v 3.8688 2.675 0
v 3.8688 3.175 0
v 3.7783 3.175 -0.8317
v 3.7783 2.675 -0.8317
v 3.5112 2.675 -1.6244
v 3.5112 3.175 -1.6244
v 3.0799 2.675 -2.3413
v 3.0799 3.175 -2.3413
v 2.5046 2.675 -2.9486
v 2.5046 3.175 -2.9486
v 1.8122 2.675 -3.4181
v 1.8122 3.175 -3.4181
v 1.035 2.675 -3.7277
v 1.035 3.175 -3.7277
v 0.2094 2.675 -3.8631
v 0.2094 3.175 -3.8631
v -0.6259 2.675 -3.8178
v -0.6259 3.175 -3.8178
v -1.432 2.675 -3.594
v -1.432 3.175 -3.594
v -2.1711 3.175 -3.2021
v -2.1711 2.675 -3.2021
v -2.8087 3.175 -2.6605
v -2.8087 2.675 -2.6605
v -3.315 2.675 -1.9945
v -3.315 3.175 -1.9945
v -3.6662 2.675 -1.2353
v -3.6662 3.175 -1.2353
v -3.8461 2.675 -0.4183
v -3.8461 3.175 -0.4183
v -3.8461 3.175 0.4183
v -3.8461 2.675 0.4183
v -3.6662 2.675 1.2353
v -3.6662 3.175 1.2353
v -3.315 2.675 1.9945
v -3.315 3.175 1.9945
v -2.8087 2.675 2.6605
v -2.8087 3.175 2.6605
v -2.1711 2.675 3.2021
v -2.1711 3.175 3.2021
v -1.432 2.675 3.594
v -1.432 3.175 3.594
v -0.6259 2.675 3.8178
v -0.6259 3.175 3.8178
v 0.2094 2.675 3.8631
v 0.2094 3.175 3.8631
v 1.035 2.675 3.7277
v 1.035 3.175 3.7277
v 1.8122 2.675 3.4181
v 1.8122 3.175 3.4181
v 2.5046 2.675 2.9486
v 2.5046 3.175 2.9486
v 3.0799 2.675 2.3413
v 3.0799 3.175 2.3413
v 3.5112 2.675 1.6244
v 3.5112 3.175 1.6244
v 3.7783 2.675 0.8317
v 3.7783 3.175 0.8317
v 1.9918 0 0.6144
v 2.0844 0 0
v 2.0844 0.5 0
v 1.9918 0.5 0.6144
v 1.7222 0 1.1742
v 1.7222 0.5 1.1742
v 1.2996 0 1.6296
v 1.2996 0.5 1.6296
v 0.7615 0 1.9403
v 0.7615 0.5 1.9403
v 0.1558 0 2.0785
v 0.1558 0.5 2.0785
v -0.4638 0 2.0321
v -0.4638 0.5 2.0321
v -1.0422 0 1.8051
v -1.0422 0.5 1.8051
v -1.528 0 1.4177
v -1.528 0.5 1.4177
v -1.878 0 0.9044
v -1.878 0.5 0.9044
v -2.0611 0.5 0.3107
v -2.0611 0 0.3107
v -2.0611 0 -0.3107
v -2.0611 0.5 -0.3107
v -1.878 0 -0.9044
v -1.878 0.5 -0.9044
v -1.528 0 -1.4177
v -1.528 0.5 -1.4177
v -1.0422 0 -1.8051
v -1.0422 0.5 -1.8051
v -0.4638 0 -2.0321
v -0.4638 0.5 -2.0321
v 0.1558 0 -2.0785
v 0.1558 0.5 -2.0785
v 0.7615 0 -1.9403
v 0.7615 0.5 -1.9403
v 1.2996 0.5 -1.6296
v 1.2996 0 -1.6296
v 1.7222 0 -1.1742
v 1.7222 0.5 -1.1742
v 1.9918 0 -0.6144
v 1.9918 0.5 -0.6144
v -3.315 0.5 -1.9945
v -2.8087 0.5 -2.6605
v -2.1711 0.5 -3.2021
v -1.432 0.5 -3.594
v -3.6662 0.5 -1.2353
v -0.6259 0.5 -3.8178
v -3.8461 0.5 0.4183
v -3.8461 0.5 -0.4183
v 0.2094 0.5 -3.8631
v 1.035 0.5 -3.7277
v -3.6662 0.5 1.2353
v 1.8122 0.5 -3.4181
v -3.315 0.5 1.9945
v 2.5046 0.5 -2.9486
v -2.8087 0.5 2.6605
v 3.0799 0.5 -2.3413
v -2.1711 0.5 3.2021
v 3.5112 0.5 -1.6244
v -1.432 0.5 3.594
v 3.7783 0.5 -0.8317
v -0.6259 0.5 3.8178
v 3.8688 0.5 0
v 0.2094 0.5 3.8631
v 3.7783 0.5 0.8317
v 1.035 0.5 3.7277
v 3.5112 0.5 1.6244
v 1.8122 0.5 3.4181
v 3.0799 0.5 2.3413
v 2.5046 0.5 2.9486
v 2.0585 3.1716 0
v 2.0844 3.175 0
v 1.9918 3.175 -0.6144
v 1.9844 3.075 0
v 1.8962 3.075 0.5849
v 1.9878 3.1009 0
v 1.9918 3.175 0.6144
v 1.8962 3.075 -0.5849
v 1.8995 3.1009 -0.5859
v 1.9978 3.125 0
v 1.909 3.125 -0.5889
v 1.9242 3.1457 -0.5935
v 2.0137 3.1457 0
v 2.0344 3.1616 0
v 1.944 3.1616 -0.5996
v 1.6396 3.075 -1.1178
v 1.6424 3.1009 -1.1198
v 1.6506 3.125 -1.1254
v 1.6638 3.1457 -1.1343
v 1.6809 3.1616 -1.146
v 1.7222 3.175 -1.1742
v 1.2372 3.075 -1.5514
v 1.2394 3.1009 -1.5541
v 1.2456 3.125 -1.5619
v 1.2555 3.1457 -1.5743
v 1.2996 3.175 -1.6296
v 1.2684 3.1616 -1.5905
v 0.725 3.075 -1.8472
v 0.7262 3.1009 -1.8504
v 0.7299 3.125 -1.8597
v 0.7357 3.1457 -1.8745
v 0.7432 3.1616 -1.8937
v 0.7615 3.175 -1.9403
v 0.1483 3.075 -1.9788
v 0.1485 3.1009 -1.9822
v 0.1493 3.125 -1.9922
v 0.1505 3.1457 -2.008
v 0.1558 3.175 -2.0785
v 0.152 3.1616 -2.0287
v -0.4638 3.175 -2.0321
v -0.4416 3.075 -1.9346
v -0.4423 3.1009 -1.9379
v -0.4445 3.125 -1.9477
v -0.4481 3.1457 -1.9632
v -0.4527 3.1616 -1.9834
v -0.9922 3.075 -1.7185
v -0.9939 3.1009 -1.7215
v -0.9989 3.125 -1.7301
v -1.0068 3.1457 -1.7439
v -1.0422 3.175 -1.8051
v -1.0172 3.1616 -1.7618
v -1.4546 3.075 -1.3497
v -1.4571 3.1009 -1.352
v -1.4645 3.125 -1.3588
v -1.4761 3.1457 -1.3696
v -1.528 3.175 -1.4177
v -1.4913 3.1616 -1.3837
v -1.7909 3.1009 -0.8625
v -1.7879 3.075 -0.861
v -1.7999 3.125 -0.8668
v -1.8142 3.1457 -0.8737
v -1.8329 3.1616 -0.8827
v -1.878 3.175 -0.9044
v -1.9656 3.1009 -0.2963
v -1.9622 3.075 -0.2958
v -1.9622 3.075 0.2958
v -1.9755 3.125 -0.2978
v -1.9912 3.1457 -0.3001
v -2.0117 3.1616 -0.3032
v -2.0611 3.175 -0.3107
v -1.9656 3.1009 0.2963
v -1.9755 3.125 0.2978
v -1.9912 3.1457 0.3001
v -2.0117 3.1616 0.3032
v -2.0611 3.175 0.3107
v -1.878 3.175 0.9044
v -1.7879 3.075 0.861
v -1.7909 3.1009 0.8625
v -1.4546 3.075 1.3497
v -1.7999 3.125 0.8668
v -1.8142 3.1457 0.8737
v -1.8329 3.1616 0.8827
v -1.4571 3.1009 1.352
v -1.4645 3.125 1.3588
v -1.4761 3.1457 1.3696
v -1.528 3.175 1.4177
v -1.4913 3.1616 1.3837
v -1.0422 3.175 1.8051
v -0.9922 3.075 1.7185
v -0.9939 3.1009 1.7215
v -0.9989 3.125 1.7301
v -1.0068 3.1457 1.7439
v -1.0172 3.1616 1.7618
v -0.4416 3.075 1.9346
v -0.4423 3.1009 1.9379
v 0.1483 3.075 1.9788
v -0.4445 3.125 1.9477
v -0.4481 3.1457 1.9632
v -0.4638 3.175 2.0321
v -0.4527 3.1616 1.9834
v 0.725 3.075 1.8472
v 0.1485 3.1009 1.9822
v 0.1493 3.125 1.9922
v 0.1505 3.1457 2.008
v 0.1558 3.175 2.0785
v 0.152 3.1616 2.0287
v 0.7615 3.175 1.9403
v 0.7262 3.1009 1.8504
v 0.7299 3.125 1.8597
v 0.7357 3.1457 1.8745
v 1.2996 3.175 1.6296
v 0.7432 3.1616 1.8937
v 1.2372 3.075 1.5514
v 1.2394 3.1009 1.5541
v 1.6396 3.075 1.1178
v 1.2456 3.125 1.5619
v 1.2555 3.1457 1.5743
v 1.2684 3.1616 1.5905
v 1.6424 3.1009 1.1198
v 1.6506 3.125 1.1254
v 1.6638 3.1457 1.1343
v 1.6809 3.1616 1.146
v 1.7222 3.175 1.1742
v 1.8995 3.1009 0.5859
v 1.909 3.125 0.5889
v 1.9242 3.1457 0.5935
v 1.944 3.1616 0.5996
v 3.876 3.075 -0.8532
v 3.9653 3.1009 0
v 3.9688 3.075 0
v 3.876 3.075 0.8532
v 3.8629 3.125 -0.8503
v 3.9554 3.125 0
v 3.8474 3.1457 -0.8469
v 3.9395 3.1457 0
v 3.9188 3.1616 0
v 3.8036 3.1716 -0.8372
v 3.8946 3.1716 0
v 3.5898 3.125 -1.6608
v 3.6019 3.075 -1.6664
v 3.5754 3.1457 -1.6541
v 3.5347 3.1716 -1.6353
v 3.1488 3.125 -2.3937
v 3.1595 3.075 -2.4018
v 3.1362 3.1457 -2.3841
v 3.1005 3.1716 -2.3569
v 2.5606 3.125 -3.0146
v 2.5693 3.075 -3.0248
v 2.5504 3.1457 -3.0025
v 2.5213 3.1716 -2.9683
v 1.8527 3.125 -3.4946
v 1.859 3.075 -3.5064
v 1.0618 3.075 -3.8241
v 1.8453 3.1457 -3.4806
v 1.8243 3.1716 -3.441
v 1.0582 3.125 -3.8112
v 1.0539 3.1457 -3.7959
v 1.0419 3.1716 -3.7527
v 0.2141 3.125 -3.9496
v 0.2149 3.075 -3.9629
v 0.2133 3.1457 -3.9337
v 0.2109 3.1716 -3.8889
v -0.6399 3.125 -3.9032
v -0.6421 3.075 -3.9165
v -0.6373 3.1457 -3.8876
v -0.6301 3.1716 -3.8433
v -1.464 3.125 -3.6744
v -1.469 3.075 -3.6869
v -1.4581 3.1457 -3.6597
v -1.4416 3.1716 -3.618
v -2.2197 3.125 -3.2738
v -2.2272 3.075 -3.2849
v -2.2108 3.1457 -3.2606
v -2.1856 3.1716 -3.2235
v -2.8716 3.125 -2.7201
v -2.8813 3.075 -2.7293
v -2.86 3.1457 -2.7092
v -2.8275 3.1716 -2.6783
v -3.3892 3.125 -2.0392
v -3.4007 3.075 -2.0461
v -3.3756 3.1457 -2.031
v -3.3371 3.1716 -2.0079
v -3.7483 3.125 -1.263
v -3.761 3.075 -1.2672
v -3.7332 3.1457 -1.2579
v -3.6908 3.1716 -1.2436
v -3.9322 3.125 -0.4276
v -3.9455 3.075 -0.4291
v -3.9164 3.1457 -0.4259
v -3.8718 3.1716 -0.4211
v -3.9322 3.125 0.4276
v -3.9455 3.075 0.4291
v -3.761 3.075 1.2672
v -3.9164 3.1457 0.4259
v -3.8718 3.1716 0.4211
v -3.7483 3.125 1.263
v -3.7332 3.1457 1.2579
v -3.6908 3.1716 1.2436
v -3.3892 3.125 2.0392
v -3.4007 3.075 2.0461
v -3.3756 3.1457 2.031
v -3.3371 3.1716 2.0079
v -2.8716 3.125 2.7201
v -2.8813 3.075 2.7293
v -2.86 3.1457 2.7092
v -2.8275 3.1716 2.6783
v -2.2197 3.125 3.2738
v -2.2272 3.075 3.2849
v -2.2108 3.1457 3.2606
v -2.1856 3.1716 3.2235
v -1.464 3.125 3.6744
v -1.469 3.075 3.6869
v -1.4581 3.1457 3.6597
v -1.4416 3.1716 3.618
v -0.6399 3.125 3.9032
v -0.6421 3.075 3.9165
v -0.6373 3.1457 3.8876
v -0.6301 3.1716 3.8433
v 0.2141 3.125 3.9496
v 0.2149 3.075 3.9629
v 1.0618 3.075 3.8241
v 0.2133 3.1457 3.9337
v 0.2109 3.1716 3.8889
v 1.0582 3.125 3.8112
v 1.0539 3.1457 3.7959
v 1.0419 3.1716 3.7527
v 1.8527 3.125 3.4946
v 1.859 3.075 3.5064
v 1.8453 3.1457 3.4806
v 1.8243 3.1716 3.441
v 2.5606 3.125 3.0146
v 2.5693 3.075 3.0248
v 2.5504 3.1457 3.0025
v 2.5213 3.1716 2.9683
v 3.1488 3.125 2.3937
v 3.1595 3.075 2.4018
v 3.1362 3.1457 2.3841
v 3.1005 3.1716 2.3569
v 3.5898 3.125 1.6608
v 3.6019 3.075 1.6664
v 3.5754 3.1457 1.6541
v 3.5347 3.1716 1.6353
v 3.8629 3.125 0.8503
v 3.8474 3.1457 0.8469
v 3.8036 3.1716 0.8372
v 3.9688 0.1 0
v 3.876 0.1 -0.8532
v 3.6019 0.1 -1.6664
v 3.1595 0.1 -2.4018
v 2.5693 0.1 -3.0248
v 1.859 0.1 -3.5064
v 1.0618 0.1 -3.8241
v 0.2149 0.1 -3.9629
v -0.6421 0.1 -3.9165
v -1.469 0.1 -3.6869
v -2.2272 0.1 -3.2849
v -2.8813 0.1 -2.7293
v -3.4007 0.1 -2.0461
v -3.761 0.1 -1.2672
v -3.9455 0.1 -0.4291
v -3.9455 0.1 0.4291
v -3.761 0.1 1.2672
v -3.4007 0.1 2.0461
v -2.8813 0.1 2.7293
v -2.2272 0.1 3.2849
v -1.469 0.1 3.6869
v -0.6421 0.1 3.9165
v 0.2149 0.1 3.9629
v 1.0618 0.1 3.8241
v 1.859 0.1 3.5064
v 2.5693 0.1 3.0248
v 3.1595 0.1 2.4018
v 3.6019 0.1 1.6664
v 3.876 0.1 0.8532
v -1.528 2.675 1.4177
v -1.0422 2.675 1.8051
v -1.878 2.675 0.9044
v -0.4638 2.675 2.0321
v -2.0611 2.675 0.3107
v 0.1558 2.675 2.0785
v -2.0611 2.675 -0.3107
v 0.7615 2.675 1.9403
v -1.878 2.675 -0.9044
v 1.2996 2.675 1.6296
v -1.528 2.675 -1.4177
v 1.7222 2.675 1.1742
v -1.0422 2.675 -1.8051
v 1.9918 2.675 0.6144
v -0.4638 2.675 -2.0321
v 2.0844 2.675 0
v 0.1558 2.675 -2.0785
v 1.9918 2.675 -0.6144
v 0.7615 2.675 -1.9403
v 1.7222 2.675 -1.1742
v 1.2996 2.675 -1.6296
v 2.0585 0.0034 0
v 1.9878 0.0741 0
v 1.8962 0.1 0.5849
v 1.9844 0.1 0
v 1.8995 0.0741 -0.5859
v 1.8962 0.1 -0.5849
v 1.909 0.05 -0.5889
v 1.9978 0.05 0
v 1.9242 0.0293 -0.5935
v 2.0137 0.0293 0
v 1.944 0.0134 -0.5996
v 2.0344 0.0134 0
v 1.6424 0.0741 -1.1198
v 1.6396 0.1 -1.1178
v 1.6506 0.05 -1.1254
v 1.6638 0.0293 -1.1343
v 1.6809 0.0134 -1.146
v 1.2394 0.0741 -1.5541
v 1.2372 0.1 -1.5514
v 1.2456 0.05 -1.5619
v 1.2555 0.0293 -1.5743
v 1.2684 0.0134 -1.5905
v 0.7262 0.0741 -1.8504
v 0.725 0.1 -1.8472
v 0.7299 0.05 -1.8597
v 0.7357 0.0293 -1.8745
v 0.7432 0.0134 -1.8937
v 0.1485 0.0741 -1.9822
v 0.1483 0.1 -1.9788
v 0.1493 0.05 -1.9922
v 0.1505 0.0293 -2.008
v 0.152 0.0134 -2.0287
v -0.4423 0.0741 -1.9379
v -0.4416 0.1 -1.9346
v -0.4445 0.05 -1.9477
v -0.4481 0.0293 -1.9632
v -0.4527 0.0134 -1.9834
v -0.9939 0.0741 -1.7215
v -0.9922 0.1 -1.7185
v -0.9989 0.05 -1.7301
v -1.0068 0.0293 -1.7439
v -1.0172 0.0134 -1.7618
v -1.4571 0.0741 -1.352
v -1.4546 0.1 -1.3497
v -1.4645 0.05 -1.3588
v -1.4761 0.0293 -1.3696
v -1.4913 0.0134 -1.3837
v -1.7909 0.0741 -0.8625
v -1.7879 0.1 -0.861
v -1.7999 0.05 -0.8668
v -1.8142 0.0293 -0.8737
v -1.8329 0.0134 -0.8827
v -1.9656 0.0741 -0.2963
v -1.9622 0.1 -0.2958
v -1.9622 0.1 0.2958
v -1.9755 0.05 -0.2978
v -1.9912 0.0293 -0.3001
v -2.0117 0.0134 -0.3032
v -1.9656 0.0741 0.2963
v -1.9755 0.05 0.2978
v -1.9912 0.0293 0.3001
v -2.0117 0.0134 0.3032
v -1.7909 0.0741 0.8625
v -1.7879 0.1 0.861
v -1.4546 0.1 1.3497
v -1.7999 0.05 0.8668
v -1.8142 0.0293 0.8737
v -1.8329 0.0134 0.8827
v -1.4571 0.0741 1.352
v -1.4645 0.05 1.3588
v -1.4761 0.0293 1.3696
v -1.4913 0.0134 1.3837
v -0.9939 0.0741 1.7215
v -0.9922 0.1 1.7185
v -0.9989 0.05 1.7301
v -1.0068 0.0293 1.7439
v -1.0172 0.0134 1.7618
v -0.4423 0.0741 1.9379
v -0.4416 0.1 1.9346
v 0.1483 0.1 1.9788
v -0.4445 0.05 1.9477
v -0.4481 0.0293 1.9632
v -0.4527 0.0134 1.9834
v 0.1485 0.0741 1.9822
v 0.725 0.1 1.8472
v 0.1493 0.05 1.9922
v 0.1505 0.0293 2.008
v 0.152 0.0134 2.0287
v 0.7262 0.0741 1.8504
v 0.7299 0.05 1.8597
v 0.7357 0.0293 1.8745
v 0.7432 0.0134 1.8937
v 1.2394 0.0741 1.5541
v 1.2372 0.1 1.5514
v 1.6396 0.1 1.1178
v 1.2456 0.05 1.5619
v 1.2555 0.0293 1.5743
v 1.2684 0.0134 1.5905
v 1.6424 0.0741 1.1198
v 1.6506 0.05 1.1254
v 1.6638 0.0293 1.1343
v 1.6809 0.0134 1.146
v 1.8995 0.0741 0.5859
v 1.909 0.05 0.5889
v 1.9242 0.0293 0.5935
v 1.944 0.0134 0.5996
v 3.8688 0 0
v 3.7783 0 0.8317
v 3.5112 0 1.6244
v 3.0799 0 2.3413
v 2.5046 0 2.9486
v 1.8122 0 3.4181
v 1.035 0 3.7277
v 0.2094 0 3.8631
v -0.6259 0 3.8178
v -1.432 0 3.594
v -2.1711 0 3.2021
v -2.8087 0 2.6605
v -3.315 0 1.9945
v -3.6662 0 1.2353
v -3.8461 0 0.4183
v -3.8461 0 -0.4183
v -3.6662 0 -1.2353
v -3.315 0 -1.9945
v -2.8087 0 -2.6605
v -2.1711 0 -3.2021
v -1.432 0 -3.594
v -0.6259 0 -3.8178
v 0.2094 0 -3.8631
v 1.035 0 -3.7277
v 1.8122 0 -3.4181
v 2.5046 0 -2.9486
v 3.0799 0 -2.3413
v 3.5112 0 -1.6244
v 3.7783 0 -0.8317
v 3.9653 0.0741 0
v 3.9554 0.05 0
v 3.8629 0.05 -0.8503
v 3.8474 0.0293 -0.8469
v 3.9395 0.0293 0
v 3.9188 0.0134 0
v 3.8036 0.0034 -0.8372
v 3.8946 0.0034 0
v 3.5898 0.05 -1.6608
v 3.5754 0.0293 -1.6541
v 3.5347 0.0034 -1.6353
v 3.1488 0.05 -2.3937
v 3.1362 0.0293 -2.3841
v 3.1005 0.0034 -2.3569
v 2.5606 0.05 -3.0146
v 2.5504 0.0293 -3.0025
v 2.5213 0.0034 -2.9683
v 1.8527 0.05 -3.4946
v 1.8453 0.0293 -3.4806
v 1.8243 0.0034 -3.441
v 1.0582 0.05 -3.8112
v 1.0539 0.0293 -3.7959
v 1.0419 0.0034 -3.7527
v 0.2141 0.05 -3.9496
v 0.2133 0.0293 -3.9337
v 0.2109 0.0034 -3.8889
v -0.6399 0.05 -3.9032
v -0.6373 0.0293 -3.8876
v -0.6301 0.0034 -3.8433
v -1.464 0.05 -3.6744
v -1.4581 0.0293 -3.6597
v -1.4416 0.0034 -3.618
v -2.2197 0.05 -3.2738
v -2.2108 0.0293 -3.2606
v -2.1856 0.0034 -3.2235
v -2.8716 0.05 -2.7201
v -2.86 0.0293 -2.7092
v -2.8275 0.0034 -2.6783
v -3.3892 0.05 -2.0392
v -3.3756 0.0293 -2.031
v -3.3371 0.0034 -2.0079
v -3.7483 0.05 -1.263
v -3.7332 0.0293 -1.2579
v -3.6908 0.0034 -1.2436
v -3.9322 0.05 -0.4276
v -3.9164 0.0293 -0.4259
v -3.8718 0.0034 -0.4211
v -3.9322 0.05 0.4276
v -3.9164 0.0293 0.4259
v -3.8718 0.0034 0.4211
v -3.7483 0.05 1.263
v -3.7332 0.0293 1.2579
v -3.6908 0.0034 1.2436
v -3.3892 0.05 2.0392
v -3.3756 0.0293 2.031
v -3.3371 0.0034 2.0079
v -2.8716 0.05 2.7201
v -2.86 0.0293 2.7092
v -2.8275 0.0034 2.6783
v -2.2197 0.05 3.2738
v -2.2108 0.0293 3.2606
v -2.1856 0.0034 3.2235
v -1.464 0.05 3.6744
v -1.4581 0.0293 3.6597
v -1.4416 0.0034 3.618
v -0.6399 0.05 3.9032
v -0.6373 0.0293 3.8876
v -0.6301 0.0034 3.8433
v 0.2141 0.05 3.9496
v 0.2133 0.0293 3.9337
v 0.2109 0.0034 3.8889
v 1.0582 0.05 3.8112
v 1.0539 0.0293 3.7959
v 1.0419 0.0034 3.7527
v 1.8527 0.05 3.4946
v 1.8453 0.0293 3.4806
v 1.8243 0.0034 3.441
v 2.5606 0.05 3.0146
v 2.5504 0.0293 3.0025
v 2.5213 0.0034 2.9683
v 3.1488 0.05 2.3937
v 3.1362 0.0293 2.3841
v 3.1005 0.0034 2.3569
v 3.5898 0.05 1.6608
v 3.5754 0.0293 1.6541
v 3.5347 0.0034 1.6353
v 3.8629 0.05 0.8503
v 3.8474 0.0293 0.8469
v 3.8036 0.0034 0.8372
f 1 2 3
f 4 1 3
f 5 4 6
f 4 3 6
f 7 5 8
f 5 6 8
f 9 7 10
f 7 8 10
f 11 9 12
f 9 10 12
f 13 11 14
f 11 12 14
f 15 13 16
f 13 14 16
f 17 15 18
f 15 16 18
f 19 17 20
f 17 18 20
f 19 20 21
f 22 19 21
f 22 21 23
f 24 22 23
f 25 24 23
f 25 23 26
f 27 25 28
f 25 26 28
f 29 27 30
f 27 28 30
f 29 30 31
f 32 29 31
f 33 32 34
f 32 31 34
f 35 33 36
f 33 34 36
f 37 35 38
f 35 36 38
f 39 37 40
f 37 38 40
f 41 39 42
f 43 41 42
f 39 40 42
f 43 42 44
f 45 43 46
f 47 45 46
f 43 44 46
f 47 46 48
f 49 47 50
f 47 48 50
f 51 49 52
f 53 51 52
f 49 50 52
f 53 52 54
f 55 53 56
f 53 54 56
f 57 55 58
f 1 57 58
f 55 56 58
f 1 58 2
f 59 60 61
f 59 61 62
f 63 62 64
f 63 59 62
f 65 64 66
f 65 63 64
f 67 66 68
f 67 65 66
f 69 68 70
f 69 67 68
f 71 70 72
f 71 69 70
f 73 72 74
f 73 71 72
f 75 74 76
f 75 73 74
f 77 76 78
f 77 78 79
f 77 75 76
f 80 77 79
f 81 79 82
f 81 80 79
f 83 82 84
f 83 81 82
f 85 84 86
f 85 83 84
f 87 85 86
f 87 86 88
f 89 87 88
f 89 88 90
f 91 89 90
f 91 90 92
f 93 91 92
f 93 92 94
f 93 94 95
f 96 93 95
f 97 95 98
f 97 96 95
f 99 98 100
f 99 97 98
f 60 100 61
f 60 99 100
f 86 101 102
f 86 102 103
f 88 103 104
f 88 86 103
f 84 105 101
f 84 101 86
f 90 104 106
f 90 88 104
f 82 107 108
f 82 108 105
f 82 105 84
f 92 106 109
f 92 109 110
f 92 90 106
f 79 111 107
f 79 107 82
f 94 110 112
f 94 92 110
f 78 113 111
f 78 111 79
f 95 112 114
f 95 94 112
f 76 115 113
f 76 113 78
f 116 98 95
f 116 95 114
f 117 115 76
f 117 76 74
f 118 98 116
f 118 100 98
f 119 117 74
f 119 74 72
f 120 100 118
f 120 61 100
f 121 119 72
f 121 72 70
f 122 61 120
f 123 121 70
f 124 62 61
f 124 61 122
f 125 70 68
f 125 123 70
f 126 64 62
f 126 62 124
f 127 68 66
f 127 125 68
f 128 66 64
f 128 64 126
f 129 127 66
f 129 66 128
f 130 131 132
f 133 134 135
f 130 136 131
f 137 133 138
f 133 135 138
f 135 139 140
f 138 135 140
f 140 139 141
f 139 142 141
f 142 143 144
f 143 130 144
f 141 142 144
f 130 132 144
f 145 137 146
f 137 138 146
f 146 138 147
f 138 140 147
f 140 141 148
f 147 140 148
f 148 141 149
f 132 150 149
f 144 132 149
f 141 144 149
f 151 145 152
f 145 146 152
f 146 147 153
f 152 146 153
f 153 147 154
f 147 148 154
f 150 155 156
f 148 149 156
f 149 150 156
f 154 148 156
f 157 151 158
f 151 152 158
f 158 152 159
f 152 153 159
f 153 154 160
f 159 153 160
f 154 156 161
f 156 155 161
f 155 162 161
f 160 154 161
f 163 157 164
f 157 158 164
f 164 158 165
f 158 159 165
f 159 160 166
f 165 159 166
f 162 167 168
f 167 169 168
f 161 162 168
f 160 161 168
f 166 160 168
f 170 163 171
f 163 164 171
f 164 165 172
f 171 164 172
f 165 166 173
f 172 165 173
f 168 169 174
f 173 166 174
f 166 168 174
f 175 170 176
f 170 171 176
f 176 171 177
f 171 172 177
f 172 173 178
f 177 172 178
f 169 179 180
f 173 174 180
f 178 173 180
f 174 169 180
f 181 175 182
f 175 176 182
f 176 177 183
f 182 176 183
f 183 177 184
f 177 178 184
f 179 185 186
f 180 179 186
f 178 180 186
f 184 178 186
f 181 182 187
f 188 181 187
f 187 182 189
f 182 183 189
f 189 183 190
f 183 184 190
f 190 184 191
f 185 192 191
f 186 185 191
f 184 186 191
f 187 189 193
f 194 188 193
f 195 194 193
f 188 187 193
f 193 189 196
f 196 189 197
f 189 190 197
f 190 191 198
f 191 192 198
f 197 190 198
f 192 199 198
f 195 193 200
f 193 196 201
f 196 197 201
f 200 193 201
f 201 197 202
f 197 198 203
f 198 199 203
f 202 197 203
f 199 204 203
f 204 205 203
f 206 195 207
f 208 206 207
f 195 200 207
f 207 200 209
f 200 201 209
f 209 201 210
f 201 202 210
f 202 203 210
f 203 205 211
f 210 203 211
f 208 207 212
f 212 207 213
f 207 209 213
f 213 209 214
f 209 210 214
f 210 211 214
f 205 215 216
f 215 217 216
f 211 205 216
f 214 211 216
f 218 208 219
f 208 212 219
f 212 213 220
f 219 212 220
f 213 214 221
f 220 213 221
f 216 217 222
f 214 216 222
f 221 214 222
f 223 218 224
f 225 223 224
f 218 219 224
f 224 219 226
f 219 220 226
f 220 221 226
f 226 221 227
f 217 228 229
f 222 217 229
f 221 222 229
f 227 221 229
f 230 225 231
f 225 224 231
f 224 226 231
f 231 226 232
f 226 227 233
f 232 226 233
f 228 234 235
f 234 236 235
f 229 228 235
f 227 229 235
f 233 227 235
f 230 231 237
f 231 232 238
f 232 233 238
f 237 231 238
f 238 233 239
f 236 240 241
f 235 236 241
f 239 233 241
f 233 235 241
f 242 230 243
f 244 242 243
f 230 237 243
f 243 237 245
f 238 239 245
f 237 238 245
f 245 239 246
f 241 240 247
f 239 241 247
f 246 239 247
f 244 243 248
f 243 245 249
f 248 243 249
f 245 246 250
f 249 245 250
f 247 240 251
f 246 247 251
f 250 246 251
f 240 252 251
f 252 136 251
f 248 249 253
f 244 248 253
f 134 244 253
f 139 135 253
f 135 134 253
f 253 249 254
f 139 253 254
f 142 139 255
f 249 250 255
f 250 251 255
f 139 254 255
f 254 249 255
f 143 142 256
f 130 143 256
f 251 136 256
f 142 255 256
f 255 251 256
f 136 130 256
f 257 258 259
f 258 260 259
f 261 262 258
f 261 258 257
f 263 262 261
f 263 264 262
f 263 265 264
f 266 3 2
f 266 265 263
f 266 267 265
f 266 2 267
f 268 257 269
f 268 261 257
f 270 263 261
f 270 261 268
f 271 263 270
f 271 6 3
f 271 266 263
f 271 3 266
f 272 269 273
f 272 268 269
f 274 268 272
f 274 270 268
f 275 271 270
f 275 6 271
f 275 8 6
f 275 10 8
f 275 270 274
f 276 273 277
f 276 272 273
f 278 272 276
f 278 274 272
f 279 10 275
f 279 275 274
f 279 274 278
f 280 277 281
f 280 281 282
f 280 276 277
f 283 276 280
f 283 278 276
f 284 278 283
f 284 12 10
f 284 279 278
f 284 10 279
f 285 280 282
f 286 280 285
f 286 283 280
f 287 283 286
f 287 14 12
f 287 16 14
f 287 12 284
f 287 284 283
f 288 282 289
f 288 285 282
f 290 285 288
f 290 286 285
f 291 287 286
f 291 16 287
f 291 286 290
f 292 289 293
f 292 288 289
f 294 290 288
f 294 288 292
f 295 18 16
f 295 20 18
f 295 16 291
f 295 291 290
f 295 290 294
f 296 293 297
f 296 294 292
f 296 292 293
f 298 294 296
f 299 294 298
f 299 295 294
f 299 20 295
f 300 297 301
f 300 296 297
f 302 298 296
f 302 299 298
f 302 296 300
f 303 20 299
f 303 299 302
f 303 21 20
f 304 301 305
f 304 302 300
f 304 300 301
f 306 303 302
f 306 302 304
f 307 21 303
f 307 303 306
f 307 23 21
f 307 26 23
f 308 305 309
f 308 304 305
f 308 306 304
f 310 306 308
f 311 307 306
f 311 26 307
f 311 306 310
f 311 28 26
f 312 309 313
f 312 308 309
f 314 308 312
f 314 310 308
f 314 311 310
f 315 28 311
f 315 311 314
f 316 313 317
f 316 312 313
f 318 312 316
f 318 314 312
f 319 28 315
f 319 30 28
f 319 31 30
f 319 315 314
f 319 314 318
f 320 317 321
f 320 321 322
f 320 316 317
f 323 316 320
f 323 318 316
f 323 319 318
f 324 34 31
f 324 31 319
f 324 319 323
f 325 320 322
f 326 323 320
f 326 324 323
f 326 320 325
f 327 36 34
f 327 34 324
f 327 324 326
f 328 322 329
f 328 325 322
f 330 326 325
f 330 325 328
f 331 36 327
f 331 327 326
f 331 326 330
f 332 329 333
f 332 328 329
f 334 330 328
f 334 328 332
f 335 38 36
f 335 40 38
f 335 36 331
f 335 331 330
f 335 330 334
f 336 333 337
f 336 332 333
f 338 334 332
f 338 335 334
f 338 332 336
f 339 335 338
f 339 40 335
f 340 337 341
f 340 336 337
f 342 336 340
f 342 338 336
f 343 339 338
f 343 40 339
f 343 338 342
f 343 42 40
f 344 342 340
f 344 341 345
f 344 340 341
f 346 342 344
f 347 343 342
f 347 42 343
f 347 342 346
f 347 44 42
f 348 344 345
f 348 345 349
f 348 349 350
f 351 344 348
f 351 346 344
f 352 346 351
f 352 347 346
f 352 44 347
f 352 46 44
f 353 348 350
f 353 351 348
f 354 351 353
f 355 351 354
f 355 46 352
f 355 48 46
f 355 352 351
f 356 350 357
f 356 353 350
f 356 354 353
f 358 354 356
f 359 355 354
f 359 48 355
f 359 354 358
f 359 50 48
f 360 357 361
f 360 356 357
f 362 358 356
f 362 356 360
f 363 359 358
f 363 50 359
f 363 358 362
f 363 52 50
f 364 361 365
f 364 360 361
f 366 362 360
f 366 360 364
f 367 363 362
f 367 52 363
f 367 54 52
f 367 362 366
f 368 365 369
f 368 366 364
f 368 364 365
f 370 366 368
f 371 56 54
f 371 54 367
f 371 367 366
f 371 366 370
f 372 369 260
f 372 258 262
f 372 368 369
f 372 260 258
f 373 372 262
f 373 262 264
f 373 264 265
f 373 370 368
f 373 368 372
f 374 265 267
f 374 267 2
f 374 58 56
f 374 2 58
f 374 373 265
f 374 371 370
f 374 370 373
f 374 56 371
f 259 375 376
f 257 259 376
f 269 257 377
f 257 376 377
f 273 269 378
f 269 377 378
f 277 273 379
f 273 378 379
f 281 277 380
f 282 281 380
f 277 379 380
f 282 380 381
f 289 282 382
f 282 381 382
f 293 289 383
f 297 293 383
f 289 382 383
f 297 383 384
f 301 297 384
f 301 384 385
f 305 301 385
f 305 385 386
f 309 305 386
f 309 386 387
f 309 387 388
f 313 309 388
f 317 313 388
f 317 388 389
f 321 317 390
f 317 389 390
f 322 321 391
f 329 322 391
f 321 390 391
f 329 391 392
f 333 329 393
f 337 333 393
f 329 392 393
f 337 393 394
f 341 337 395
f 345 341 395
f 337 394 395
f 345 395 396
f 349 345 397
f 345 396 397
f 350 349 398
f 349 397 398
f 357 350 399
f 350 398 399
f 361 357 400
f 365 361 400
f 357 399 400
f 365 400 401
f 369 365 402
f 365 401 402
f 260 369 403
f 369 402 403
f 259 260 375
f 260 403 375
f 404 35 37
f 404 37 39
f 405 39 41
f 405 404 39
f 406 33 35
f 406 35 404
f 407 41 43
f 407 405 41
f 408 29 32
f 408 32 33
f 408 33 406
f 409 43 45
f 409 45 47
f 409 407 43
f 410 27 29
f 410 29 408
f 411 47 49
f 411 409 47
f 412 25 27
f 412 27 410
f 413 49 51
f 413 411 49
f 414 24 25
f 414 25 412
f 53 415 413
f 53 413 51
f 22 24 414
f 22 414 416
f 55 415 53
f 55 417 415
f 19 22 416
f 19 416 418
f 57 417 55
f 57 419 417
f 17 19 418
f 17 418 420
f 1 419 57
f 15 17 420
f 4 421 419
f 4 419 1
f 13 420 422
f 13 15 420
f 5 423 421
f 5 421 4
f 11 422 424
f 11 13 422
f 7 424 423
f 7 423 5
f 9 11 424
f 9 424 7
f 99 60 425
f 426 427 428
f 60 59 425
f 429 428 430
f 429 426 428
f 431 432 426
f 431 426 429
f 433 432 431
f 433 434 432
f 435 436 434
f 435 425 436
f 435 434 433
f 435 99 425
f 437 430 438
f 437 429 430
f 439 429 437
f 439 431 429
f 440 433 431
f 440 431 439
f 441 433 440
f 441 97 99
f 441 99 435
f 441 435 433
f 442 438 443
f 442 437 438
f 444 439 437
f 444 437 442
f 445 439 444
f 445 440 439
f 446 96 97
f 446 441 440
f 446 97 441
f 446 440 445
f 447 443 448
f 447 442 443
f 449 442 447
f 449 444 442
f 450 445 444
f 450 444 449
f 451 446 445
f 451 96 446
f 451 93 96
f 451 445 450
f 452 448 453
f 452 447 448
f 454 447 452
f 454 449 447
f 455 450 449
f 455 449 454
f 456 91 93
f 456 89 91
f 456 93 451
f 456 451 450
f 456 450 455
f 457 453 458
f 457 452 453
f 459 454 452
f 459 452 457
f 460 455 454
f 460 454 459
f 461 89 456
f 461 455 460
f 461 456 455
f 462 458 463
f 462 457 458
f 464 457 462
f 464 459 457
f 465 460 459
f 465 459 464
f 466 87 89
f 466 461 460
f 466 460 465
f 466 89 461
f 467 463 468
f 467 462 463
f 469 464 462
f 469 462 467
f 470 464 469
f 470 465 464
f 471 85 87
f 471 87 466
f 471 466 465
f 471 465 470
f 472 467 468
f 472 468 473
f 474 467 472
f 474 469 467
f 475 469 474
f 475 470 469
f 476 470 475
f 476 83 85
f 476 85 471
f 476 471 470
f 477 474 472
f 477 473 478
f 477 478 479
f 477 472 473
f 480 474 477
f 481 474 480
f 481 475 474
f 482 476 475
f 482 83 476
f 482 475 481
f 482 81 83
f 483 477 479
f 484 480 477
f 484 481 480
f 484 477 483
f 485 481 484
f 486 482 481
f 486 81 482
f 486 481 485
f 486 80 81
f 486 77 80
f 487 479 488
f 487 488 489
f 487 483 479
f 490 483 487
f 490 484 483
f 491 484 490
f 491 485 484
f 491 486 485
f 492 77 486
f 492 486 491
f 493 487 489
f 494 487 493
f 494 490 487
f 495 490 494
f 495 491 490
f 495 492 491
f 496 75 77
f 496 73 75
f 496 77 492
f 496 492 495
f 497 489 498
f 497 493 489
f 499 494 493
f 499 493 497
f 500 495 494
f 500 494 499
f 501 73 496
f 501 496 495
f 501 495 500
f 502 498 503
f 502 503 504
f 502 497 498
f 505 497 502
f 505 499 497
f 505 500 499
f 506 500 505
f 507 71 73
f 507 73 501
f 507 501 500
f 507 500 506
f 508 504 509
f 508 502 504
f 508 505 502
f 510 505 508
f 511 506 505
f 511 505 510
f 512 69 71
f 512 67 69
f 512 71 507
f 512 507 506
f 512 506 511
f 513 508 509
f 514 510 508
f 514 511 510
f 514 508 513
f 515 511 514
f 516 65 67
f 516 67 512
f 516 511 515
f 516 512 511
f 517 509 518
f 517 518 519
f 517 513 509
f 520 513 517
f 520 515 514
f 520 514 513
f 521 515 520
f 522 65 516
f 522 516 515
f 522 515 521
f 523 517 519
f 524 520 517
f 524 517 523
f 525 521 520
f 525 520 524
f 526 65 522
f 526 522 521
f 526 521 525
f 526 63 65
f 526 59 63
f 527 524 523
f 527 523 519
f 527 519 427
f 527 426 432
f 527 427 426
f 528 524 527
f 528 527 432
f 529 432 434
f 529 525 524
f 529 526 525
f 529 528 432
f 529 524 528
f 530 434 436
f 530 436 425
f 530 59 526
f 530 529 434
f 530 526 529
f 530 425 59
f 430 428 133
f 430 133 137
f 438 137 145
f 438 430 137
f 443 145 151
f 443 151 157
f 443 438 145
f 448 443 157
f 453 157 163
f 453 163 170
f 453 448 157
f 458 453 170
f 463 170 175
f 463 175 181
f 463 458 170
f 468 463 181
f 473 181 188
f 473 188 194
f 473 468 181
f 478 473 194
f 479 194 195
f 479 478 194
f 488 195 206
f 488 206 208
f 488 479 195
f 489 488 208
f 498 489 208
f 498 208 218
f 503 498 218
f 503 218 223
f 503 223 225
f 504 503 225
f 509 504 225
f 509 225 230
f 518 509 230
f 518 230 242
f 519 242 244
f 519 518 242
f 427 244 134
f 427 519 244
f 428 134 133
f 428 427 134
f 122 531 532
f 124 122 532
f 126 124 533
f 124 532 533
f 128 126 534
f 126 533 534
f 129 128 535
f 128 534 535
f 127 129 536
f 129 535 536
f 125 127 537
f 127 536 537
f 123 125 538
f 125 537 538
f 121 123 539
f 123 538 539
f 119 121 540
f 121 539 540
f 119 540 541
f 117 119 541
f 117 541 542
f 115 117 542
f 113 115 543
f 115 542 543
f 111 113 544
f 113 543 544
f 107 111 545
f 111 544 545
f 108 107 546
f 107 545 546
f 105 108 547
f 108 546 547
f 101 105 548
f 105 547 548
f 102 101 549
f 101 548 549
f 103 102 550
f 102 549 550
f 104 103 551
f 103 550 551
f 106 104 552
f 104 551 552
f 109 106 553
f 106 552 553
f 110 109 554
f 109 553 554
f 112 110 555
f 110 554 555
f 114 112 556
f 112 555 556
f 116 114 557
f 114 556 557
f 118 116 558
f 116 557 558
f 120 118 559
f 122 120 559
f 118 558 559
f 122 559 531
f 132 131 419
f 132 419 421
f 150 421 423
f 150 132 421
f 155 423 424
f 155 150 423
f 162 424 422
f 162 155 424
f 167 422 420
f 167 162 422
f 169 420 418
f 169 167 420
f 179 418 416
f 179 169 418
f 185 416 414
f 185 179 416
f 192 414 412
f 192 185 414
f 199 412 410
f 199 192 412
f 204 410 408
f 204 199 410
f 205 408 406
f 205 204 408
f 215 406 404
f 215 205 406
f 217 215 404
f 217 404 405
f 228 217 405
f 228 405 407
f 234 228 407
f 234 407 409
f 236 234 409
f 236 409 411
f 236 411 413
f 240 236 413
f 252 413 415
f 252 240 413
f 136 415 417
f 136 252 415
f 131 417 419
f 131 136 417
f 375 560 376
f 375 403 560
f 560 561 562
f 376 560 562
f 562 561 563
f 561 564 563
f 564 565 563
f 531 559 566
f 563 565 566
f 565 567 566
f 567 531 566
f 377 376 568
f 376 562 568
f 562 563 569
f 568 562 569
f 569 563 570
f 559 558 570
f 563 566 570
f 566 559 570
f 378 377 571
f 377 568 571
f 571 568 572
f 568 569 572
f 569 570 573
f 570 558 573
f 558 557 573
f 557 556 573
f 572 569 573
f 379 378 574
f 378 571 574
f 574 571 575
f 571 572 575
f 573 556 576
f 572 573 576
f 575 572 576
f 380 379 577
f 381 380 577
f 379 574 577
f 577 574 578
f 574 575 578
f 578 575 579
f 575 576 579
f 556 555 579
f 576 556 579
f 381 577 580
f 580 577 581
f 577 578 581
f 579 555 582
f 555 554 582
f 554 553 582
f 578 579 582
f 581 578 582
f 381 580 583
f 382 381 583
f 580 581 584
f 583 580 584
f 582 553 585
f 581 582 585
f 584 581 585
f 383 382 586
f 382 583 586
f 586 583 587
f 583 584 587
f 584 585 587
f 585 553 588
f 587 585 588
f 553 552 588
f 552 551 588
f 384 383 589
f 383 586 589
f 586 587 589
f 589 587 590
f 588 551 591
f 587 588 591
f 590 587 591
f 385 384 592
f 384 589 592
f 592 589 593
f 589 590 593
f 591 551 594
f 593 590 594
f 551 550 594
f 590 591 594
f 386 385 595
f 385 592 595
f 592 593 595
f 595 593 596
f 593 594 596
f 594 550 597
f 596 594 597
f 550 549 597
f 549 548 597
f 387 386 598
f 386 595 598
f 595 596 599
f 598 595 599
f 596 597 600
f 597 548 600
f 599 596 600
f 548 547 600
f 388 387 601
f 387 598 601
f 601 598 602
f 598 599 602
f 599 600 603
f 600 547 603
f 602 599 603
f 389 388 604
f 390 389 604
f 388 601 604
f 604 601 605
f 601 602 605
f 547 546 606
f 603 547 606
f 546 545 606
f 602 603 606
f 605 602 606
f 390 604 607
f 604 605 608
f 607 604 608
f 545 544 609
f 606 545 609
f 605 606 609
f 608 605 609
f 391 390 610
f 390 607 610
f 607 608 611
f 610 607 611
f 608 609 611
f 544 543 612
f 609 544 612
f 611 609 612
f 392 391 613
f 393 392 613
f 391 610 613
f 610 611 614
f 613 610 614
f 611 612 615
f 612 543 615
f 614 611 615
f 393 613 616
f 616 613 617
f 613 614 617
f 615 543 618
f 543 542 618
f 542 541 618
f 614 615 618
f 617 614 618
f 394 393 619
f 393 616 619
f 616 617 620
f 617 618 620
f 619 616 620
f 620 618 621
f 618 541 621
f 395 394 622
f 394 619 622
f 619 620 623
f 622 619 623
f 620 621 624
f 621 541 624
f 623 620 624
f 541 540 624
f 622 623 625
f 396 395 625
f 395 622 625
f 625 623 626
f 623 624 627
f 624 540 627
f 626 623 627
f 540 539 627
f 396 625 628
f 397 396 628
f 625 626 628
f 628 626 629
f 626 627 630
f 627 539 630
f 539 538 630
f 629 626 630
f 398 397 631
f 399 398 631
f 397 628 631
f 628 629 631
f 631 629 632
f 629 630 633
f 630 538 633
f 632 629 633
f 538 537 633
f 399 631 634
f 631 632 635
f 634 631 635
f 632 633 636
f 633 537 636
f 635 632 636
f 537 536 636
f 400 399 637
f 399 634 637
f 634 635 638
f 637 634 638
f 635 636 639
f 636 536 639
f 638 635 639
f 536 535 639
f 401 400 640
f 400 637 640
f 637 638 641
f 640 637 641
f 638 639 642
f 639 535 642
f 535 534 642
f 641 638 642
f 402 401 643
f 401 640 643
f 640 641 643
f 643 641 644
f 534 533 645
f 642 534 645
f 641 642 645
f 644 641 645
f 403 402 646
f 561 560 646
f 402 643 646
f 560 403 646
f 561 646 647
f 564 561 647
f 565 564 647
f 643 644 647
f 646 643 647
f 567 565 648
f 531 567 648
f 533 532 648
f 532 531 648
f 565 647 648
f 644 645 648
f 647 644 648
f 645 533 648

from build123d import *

# Parameters (mm, degrees)
SKETCH1_R           = 3.96875
SKETCH1_R_2         = 1.984375
BOSS_EXTRUDE1_DEPTH = 3.175
FILLET1_R           = 0.1
SKETCH2_R           = 3.86875
SKETCH2_R_2         = 2.084375
CUT_EXTRUDE1_DEPTH  = 0.5
SKETCH3_R           = 3.86875
SKETCH3_R_2         = 2.084375
CUT_EXTRUDE2_DEPTH  = 0.5


with BuildPart() as part:
    # Sketch1 → Boss-Extrude1 (new body)
    with BuildSketch(Plane(origin=(0, 0, 0), x_dir=(1, 0, 0), z_dir=(0, 1, 0))):
        Circle(SKETCH1_R)
        Circle(SKETCH1_R_2, mode=Mode.SUBTRACT)
    extrude(amount=BOSS_EXTRUDE1_DEPTH)

    # Fillet1
    fillet1_edges = [part.edges().sort_by_distance(p)[0] for p in [
        (-3.96875, 0, 0),
        (-3.96875, 3.175, 0),
        (-1.984375, 0, 0),
        (-1.984375, 3.175, 0),
    ]]
    fillet(fillet1_edges, radius=FILLET1_R)

    # Sketch2 → Cut-Extrude1 (cut)
    with BuildSketch(Plane(origin=(0, 3.175, 0), x_dir=(1, 0, 0), z_dir=(0, 1, 0))):
        Circle(SKETCH2_R)
        Circle(SKETCH2_R_2, mode=Mode.SUBTRACT)
    extrude(amount=-CUT_EXTRUDE1_DEPTH, mode=Mode.SUBTRACT)

    # Sketch3 → Cut-Extrude2 (cut)
    with BuildSketch(Plane.XZ):
        Circle(SKETCH3_R)
        Circle(SKETCH3_R_2, mode=Mode.SUBTRACT)
    extrude(amount=-CUT_EXTRUDE2_DEPTH, mode=Mode.SUBTRACT)


solid = part.part
